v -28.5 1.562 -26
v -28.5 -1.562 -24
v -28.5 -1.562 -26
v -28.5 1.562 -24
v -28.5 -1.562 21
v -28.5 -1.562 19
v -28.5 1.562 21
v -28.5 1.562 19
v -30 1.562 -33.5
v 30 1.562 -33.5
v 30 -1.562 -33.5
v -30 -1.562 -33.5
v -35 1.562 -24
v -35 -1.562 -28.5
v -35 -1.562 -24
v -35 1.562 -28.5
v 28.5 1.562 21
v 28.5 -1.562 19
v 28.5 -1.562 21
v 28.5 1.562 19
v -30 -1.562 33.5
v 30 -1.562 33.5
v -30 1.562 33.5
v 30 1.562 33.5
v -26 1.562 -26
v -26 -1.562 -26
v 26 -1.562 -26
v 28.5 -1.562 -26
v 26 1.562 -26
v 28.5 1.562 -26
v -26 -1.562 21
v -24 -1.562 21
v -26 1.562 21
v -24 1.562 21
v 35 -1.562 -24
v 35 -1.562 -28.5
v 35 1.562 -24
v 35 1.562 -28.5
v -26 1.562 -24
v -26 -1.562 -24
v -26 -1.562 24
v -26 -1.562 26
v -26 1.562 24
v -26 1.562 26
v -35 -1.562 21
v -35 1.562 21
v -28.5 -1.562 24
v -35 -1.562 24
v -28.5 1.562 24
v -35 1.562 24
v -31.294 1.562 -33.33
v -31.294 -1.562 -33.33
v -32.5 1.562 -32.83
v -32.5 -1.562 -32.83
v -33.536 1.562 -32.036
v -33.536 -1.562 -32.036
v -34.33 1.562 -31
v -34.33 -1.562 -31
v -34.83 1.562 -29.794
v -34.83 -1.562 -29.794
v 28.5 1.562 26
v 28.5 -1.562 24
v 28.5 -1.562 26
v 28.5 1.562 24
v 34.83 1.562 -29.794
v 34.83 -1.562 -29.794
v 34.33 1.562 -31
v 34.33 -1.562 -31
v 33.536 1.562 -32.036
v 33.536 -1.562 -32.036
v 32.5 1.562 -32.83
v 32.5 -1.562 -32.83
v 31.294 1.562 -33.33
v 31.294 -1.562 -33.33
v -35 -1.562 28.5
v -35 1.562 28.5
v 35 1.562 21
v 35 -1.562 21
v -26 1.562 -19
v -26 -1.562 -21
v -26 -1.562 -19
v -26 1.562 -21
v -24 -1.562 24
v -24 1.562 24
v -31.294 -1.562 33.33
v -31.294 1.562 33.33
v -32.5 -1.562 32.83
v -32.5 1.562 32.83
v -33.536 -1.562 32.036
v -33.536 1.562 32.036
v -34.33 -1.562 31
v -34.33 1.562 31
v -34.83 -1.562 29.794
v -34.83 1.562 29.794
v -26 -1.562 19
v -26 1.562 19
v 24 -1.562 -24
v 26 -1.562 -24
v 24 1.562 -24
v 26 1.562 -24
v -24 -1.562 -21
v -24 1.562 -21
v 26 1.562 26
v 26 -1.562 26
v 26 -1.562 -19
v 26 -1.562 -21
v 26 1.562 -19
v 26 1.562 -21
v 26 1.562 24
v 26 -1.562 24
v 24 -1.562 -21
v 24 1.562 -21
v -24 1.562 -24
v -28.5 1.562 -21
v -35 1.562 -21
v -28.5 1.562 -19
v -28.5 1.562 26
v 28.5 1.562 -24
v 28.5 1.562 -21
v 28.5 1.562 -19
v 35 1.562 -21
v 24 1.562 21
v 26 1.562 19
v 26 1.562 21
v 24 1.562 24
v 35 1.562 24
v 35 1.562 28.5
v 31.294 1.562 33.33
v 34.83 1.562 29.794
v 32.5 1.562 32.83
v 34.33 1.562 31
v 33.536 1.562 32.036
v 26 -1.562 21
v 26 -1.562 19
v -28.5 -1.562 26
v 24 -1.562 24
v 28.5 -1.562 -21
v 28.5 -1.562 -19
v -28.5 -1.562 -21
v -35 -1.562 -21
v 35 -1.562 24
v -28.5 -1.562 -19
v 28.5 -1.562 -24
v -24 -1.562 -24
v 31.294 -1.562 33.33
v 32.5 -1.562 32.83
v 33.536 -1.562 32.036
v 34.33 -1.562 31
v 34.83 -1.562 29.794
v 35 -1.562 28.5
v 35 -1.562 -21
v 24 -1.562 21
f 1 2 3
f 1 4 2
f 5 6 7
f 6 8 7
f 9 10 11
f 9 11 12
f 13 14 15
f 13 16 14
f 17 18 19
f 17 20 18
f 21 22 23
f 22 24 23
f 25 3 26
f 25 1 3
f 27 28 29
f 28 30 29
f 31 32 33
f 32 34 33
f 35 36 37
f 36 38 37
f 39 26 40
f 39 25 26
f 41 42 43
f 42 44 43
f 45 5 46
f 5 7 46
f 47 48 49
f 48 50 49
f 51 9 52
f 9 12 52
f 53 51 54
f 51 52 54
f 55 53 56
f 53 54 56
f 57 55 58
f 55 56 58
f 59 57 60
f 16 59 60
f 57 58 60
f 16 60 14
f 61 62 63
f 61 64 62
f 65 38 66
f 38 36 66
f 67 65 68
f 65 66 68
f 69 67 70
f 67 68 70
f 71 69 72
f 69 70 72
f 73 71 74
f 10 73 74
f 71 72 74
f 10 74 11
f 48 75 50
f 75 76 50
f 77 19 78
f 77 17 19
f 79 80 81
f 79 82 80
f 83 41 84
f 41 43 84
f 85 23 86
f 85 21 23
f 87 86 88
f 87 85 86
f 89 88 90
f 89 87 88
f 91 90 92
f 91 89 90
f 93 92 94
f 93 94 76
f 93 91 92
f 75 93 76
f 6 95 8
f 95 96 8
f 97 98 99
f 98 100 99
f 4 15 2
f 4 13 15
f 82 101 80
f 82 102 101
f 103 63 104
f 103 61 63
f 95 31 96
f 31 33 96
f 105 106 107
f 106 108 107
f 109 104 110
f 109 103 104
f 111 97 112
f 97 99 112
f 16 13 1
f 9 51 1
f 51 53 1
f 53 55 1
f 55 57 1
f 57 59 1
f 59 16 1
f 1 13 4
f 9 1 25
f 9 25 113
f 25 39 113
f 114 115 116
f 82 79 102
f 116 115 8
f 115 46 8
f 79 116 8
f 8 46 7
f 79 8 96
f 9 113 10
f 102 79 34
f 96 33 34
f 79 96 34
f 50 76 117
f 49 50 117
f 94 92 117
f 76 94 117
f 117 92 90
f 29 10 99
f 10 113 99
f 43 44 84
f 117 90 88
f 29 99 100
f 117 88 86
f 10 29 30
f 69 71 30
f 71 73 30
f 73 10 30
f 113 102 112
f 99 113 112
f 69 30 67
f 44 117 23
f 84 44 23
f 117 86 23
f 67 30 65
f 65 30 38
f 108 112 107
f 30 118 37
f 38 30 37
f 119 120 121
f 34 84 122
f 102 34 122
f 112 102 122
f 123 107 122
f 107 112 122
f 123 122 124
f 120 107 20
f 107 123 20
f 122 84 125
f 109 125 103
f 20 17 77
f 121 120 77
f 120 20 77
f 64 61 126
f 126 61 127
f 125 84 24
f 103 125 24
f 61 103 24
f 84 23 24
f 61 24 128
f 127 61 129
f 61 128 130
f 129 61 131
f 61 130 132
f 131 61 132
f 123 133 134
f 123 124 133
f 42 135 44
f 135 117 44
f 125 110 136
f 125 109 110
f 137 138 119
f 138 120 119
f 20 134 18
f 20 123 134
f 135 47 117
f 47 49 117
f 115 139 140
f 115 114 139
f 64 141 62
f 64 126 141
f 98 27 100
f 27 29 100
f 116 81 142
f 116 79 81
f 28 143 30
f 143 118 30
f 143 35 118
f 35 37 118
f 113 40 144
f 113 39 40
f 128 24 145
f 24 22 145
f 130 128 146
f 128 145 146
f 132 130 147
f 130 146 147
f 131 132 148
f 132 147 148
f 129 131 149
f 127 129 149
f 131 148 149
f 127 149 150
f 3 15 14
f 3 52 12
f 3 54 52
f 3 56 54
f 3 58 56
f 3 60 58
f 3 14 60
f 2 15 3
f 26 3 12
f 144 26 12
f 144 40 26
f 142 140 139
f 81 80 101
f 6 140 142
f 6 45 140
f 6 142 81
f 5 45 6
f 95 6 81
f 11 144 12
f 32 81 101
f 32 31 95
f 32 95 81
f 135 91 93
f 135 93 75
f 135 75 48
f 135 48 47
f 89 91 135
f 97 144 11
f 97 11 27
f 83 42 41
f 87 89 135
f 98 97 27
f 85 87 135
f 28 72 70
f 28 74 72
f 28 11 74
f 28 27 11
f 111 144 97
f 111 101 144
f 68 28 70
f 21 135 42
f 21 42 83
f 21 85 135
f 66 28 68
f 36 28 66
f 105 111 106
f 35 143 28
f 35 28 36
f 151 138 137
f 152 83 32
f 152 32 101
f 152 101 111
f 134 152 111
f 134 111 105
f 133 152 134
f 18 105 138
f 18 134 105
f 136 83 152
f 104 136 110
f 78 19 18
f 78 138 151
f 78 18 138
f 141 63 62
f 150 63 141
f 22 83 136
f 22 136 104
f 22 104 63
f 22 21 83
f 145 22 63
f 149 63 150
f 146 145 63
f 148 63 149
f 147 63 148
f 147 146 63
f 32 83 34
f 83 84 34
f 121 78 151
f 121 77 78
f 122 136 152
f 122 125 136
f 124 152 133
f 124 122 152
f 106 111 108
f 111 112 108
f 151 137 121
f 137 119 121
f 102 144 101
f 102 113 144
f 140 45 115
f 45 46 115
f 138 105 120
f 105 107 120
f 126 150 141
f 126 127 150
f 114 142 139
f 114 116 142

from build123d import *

# Parameters (mm, degrees)
BOSS_EXTRUDE1_DEPTH  = 1.5625
MIRROR4_COPY_1_DEPTH = 1.5625
FILLET1_R            = 5


with BuildPart() as part:
    # Sketch1 → Boss-Extrude1 (new body, symmetric)
    with BuildSketch(Plane(origin=(0, 0, 0), x_dir=(1, 0, 0), z_dir=(0, 1, 0))):
        Polygon((0, 33.5), (35, 33.5), (35, 24), (28.5, 24), (28.5, 26), (26, 26), (26, 24), (24, 24), (24, 21), (26, 21), (26, 19), (28.5, 19), (28.5, 21), (35, 21), (35, 0), (0, 0), align=None)
    boss_extrude1 = extrude(amount=BOSS_EXTRUDE1_DEPTH, both=True)

    # Mirror1: Boss-Extrude1 across plane
    add(boss_extrude1.mirror(Plane(origin=(0, 0, 0), x_dir=(0, 0, 1), z_dir=(1, 0, 0))))

    # Mirror4: Boss-Extrude1 across plane
    add(boss_extrude1.mirror(Plane.XY))

    # Mirror4 copy 1 sketch → Mirror4 copy 1 (add, symmetric)
    with BuildSketch(Plane(origin=(0, 0, 0), x_dir=(-1, 0, 0), z_dir=(0, 1, 0))):
        Polygon((0, 33.5), (35, 33.5), (35, 24), (28.5, 24), (28.5, 26), (26, 26), (26, 24), (24, 24), (24, 21), (26, 21), (26, 19), (28.5, 19), (28.5, 21), (35, 21), (35, 0), (0, 0), align=None)
    extrude(amount=MIRROR4_COPY_1_DEPTH, both=True)

    # Fillet1
    fillet1_edges = [part.edges().sort_by_distance(p)[0] for p in [
        (35, 0, 33.5),
        (35, 0, -33.5),
        (-35, 0, -33.5),
        (-35, 0, 33.5),
    ]]
    fillet(fillet1_edges, radius=FILLET1_R)


solid = part.part
